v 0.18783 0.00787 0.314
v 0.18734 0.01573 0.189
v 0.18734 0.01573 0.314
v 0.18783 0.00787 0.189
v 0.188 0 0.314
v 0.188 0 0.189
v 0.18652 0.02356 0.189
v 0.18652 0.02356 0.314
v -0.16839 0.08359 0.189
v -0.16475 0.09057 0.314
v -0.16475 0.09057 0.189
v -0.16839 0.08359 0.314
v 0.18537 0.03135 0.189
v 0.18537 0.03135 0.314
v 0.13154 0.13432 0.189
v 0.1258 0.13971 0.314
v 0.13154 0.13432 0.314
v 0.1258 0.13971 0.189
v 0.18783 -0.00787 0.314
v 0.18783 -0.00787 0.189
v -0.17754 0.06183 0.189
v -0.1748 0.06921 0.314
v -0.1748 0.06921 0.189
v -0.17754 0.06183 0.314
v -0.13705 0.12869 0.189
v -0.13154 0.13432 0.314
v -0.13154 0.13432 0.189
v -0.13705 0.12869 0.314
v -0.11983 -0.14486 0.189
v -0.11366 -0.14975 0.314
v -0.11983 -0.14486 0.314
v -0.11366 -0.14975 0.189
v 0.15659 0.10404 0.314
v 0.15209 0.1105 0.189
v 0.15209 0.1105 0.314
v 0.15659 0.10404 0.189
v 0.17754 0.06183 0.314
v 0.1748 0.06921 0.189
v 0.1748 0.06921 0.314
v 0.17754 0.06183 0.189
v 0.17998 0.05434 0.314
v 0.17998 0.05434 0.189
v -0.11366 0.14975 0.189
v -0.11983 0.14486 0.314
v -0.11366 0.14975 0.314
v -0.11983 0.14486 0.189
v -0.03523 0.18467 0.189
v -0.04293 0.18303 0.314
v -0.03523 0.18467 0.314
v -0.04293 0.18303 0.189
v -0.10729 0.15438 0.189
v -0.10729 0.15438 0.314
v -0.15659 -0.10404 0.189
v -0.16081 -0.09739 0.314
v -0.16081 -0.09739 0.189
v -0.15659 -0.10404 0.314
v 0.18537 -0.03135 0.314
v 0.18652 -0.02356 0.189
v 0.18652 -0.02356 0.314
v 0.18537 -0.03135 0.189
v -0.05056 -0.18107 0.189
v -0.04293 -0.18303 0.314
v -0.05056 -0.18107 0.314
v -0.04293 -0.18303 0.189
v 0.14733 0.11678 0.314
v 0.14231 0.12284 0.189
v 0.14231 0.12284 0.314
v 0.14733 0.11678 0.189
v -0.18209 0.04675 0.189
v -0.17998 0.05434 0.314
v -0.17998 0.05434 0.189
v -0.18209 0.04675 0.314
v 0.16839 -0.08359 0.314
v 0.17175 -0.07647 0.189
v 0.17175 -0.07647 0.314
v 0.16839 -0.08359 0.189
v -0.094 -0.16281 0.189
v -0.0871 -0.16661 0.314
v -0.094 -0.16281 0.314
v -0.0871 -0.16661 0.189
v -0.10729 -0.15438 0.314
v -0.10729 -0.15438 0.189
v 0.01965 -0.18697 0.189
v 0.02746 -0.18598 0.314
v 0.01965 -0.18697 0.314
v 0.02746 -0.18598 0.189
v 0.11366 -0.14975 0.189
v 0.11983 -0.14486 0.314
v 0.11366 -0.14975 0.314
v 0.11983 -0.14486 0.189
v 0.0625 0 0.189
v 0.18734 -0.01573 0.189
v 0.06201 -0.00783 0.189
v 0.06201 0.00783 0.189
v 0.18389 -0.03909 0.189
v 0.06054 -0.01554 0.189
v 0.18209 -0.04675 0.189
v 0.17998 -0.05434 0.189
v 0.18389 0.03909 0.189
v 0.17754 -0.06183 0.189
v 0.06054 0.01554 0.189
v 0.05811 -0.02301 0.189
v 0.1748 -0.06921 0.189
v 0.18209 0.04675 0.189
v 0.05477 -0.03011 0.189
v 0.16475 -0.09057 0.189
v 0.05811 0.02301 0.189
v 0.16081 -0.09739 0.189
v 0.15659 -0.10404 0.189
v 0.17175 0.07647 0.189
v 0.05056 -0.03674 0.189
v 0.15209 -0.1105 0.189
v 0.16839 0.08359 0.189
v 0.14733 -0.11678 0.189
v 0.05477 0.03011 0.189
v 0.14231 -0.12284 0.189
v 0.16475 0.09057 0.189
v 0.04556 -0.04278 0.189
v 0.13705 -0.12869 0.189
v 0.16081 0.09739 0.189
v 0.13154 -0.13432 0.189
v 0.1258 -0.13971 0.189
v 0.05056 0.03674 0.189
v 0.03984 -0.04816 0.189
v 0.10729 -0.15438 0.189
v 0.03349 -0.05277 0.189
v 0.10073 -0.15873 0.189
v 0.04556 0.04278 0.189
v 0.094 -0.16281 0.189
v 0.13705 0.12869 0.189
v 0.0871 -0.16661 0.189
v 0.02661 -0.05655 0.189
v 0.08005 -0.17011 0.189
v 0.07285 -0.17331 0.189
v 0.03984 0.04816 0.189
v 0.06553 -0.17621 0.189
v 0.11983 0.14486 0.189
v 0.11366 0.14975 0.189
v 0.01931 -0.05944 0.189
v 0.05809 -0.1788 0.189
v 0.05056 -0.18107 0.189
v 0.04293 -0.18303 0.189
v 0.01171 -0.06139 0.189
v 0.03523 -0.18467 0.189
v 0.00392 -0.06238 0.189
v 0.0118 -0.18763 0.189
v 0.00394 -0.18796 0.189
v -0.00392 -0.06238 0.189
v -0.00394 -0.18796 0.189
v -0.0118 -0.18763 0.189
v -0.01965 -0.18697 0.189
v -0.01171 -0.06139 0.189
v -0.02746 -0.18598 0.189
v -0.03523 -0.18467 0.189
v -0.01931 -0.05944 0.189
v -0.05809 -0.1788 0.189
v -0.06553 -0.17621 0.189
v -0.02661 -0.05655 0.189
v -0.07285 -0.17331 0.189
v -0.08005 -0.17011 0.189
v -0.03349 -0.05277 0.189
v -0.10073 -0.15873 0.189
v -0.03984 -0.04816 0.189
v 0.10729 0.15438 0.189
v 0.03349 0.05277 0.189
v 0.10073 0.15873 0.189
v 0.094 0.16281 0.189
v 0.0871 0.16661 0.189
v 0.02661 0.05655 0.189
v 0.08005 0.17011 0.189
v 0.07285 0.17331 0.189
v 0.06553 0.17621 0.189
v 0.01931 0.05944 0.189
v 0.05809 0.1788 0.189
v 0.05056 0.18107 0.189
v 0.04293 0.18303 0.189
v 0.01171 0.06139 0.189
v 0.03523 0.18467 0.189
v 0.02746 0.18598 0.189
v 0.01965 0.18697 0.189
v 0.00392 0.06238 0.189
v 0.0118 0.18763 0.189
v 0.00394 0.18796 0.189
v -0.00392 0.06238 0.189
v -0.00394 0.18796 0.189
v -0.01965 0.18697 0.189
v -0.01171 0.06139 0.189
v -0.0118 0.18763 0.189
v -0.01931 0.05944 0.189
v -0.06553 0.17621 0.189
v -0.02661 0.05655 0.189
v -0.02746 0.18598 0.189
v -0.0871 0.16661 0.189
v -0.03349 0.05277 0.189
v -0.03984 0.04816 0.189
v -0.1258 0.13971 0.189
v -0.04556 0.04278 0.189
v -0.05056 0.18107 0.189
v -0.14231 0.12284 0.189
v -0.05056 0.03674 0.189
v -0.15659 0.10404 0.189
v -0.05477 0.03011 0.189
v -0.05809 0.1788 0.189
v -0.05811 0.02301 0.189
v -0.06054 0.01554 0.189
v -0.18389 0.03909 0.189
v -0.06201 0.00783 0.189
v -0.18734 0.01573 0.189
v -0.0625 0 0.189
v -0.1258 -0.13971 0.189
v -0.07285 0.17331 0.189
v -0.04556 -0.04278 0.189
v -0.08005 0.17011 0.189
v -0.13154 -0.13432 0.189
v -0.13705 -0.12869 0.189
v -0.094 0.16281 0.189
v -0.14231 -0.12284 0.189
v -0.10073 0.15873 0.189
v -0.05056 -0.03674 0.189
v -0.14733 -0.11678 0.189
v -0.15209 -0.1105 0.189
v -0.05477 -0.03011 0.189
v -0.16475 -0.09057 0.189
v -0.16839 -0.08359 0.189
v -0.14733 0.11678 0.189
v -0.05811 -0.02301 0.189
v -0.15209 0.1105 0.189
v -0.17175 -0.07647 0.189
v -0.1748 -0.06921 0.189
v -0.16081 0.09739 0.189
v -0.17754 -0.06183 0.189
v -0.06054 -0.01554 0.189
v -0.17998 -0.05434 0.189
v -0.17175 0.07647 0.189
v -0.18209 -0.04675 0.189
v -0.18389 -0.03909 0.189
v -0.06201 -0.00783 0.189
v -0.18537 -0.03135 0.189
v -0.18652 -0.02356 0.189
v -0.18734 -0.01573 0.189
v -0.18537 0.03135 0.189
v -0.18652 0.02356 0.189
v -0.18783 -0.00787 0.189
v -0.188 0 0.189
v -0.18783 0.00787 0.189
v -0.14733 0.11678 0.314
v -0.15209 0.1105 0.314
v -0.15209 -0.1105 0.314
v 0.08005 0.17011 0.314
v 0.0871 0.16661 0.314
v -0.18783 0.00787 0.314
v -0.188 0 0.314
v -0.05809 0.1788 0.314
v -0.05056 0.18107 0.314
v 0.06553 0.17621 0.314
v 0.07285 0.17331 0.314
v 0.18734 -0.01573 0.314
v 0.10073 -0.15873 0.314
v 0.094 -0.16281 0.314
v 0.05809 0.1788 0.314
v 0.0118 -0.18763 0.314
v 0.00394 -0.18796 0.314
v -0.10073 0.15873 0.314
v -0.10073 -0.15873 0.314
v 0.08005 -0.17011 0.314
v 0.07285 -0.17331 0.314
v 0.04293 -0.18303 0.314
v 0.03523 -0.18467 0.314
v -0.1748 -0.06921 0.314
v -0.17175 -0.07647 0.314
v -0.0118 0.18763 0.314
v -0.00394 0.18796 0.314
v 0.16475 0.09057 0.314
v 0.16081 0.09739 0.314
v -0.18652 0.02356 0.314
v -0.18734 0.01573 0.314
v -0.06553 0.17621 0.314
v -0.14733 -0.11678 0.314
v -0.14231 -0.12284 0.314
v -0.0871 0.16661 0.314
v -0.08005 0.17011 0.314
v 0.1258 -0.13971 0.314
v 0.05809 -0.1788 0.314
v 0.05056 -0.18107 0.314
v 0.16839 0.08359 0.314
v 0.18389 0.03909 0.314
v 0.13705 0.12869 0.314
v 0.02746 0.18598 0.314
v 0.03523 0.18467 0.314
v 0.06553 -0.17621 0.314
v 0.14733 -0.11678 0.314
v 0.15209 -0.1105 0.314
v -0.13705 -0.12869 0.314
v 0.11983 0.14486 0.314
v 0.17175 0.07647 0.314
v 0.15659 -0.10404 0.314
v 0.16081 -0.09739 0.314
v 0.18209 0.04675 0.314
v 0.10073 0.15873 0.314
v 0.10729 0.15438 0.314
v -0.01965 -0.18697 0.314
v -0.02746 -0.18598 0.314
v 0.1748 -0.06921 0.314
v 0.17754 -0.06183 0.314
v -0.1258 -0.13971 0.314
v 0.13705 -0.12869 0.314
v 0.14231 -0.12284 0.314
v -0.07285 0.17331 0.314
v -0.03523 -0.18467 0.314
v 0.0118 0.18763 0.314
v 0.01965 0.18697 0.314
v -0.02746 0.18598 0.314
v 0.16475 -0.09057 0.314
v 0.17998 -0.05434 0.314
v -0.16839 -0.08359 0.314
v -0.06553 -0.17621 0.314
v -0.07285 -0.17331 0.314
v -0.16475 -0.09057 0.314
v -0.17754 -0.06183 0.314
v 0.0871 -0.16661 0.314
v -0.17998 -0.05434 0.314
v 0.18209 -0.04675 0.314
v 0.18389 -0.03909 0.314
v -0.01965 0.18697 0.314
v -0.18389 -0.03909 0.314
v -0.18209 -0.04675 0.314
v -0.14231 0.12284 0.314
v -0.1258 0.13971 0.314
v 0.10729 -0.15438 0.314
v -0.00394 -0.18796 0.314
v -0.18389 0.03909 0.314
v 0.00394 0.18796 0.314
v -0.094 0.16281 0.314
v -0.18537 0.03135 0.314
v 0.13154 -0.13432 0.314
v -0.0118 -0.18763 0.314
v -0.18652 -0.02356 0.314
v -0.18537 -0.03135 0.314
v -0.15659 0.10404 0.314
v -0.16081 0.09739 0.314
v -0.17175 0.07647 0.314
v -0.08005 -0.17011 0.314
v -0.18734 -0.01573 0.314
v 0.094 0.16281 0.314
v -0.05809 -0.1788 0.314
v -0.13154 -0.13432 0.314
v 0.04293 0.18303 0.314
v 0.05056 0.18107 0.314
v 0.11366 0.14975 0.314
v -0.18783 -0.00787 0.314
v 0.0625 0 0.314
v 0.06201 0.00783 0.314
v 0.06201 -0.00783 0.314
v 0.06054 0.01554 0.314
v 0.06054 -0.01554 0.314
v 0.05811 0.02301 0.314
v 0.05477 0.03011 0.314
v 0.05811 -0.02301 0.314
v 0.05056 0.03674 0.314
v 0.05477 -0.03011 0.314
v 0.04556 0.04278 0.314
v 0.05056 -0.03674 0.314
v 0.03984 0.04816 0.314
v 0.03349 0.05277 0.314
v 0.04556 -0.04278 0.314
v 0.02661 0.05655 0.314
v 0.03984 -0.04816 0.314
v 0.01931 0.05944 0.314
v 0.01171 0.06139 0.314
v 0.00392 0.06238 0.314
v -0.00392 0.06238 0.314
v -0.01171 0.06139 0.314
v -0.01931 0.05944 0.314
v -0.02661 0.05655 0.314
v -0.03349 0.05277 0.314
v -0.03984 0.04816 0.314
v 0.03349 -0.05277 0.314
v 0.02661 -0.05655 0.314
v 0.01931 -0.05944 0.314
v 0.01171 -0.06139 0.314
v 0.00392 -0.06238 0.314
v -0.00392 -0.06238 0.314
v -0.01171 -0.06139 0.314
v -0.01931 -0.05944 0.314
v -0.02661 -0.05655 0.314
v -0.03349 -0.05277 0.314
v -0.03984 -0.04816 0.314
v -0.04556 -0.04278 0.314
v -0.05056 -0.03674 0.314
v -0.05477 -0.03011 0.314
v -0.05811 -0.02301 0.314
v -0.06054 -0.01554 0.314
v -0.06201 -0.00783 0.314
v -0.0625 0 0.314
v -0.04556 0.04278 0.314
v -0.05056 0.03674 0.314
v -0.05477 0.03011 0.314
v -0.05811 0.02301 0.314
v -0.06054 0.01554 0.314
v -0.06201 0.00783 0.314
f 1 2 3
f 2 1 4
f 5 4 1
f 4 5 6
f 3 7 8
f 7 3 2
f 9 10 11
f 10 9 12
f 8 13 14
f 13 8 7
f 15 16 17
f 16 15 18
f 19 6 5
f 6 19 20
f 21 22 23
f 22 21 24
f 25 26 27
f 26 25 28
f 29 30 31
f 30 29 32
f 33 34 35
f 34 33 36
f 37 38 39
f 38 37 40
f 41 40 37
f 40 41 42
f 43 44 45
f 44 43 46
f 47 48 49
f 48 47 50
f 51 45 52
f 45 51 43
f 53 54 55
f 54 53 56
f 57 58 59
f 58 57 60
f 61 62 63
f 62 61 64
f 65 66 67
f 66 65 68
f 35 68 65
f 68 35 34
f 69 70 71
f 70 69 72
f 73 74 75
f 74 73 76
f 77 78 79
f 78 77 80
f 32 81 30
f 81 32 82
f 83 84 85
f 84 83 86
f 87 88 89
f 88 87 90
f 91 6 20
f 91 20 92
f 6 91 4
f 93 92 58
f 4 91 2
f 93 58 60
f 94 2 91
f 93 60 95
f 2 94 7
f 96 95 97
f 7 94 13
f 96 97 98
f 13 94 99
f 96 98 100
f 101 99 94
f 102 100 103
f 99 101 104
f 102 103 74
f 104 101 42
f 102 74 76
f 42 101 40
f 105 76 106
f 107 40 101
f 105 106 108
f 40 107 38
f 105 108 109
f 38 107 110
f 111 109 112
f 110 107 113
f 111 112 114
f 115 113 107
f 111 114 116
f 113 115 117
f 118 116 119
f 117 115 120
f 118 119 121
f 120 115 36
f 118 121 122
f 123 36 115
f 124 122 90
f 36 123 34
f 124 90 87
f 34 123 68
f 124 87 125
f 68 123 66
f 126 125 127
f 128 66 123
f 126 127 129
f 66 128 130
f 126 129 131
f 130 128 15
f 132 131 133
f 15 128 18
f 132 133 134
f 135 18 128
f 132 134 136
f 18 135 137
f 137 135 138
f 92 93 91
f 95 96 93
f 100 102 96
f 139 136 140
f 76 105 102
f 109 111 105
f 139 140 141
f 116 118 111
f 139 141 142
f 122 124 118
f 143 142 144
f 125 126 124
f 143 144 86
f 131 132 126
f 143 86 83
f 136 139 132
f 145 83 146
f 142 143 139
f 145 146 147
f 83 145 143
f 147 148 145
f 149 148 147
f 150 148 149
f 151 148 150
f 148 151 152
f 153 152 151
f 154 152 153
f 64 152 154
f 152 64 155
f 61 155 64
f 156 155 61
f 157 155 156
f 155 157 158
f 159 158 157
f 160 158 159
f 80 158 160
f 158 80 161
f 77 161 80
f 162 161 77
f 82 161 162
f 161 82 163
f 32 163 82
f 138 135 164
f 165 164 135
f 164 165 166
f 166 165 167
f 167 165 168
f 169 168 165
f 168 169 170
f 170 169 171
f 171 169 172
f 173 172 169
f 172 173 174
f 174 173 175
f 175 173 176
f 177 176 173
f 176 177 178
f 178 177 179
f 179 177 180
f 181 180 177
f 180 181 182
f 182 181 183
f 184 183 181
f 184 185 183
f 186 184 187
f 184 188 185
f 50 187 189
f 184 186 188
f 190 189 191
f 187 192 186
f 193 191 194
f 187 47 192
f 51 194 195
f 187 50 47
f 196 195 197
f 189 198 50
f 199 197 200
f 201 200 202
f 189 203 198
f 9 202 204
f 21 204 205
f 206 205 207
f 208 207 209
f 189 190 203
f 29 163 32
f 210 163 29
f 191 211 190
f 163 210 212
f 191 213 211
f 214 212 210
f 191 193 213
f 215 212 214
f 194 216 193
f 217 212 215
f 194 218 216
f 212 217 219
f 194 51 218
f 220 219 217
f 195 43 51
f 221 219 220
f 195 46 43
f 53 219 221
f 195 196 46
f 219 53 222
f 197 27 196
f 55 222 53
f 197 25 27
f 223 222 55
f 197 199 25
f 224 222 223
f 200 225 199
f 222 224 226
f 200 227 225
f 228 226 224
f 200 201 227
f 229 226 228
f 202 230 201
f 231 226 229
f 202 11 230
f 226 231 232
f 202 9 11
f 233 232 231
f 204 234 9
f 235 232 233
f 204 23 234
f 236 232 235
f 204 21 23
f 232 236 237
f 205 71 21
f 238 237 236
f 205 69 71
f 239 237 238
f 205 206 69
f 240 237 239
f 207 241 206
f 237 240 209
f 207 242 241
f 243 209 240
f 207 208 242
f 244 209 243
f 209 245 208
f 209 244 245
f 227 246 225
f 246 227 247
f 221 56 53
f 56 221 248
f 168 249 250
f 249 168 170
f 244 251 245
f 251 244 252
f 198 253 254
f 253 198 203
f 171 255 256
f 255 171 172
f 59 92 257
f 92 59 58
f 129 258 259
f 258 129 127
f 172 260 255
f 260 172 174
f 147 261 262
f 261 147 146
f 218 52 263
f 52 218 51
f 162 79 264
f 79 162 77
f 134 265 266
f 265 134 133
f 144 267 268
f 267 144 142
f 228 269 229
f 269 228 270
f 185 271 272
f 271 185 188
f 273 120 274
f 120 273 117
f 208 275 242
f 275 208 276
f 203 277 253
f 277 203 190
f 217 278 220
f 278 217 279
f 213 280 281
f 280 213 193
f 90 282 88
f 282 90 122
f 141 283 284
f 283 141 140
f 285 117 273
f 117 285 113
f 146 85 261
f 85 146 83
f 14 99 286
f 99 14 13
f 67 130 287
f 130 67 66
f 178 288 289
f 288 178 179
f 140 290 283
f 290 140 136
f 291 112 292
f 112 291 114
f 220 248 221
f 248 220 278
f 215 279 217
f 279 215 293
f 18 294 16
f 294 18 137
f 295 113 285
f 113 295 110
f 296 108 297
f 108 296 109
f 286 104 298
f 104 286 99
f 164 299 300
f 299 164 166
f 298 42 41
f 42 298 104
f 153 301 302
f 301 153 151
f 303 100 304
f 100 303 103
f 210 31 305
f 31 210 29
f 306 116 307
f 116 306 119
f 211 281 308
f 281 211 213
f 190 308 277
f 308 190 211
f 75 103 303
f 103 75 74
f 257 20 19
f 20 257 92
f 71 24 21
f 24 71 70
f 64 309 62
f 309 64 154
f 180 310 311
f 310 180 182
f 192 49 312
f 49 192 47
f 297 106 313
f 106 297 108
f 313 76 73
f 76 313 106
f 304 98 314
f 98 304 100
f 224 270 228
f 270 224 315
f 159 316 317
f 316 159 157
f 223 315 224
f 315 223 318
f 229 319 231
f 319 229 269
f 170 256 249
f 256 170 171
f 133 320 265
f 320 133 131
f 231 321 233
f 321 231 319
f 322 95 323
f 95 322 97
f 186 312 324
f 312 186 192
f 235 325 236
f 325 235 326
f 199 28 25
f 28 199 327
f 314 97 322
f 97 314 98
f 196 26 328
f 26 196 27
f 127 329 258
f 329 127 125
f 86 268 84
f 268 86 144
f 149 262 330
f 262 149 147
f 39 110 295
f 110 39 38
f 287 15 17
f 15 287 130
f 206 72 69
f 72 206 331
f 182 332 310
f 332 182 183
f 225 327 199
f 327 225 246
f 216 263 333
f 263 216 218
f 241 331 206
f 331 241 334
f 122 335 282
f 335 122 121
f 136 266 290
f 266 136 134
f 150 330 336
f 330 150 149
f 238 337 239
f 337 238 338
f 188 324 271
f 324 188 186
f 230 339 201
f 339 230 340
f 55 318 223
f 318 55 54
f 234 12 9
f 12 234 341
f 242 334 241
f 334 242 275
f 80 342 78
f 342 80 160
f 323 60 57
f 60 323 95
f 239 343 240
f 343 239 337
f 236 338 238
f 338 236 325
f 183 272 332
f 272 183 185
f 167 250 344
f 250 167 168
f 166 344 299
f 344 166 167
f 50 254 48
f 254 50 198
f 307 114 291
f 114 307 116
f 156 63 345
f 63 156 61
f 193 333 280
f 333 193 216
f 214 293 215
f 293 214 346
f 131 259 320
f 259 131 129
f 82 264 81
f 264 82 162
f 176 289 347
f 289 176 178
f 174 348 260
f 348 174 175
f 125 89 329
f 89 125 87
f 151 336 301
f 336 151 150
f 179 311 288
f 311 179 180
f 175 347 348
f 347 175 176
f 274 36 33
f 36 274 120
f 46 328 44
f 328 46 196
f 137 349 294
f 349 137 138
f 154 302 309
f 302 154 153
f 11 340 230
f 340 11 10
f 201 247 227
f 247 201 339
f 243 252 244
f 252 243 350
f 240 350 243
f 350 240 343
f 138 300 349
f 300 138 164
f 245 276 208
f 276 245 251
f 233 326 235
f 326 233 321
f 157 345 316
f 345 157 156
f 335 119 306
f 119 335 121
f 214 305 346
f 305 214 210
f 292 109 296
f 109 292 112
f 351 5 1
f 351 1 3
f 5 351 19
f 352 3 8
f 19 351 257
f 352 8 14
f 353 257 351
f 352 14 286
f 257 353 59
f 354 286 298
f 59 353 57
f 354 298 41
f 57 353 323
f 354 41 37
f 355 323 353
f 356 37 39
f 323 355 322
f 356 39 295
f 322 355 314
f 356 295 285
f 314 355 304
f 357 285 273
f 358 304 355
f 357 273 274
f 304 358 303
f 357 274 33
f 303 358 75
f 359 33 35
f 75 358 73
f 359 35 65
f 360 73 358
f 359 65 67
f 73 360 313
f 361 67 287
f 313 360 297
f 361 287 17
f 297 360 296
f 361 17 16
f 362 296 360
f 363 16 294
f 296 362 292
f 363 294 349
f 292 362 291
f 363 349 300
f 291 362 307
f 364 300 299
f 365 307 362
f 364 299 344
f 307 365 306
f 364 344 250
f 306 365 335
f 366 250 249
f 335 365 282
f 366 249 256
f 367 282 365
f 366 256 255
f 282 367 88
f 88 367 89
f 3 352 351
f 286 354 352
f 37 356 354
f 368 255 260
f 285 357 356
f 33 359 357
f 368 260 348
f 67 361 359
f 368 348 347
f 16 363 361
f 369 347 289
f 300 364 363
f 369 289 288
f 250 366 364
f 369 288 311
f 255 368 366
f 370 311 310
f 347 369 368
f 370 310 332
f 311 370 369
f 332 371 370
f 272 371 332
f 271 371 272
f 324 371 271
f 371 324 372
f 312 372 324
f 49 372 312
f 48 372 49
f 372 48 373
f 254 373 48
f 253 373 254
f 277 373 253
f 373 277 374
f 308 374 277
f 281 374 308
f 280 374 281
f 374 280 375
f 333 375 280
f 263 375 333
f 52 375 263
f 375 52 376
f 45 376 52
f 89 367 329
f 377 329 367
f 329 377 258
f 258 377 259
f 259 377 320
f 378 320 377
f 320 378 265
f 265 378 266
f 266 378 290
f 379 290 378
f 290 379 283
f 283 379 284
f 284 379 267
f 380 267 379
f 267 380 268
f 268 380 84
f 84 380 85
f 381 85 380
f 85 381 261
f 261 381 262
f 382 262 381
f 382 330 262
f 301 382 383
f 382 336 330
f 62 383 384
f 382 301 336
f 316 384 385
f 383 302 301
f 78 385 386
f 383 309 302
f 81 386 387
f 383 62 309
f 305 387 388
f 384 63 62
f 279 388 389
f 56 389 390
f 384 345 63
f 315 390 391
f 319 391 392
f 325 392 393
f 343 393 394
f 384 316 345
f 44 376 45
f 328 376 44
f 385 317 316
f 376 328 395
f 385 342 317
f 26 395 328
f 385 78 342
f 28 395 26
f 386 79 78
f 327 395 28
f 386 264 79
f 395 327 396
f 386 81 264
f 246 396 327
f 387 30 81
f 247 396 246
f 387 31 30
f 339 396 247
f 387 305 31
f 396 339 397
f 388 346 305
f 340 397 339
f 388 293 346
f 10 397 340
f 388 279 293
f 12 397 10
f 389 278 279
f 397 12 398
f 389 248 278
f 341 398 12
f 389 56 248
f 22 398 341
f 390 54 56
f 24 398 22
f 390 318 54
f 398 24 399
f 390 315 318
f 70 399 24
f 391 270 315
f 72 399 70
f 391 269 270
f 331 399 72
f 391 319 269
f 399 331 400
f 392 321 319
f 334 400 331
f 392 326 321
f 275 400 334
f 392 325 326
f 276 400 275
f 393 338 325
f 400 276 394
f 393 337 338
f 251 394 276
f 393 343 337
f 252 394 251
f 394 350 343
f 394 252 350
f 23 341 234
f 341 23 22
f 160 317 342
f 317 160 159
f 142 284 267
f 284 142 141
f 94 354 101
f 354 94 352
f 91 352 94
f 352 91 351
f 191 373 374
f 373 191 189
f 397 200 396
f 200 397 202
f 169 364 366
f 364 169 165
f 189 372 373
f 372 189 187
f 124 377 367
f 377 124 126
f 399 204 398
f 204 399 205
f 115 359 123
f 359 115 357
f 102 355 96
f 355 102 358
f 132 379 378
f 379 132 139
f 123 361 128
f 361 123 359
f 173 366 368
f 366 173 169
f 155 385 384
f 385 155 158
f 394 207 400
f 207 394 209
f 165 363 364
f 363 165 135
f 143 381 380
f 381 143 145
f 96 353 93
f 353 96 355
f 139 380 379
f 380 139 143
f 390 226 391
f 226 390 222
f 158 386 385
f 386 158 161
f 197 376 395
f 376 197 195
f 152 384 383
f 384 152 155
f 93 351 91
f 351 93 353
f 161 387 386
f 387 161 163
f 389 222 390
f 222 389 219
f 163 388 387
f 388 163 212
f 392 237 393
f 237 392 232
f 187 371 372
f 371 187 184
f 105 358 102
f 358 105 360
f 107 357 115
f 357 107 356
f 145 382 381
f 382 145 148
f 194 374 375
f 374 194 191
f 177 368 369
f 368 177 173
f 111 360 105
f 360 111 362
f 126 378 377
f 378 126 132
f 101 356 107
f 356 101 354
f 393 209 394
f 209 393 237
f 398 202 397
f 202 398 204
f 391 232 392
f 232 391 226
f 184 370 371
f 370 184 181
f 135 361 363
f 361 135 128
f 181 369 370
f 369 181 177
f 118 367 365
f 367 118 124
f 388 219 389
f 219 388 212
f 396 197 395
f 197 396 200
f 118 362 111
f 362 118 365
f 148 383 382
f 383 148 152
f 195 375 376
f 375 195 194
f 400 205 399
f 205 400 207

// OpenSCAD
difference() {
  union() {
    linear_extrude(height = 0.250, center = false, convexity = 25, slices = 5)
                   import(file = "ActuatorLever.dxf", scale = 1/25.4, layer="Lever");

    translate([0, 0, 0.189])
      cylinder(h = 0.125, d = 0.376, center = false, $fn = 150);
  }

  cylinder(h = 1, d = 0.125, center = true, $fn = 50);

  translate([-7.6225/25.4, 0, 0])
    cylinder(h = 1, d = 0.063, center=true, $fn = 25);

  translate([-13.37/25.4, 0, 0])
    cylinder(h = 1, d = 0.063, center=true, $fn = 25);

  translate([-19.11/25.4, 0, 0])
    cylinder(h = 1, d = 0.063, center=true, $fn = 25);

  translate([-24.855/25.4, 0, 0])
    cylinder(h = 1, d = 0.063, center=true, $fn = 25);
}
